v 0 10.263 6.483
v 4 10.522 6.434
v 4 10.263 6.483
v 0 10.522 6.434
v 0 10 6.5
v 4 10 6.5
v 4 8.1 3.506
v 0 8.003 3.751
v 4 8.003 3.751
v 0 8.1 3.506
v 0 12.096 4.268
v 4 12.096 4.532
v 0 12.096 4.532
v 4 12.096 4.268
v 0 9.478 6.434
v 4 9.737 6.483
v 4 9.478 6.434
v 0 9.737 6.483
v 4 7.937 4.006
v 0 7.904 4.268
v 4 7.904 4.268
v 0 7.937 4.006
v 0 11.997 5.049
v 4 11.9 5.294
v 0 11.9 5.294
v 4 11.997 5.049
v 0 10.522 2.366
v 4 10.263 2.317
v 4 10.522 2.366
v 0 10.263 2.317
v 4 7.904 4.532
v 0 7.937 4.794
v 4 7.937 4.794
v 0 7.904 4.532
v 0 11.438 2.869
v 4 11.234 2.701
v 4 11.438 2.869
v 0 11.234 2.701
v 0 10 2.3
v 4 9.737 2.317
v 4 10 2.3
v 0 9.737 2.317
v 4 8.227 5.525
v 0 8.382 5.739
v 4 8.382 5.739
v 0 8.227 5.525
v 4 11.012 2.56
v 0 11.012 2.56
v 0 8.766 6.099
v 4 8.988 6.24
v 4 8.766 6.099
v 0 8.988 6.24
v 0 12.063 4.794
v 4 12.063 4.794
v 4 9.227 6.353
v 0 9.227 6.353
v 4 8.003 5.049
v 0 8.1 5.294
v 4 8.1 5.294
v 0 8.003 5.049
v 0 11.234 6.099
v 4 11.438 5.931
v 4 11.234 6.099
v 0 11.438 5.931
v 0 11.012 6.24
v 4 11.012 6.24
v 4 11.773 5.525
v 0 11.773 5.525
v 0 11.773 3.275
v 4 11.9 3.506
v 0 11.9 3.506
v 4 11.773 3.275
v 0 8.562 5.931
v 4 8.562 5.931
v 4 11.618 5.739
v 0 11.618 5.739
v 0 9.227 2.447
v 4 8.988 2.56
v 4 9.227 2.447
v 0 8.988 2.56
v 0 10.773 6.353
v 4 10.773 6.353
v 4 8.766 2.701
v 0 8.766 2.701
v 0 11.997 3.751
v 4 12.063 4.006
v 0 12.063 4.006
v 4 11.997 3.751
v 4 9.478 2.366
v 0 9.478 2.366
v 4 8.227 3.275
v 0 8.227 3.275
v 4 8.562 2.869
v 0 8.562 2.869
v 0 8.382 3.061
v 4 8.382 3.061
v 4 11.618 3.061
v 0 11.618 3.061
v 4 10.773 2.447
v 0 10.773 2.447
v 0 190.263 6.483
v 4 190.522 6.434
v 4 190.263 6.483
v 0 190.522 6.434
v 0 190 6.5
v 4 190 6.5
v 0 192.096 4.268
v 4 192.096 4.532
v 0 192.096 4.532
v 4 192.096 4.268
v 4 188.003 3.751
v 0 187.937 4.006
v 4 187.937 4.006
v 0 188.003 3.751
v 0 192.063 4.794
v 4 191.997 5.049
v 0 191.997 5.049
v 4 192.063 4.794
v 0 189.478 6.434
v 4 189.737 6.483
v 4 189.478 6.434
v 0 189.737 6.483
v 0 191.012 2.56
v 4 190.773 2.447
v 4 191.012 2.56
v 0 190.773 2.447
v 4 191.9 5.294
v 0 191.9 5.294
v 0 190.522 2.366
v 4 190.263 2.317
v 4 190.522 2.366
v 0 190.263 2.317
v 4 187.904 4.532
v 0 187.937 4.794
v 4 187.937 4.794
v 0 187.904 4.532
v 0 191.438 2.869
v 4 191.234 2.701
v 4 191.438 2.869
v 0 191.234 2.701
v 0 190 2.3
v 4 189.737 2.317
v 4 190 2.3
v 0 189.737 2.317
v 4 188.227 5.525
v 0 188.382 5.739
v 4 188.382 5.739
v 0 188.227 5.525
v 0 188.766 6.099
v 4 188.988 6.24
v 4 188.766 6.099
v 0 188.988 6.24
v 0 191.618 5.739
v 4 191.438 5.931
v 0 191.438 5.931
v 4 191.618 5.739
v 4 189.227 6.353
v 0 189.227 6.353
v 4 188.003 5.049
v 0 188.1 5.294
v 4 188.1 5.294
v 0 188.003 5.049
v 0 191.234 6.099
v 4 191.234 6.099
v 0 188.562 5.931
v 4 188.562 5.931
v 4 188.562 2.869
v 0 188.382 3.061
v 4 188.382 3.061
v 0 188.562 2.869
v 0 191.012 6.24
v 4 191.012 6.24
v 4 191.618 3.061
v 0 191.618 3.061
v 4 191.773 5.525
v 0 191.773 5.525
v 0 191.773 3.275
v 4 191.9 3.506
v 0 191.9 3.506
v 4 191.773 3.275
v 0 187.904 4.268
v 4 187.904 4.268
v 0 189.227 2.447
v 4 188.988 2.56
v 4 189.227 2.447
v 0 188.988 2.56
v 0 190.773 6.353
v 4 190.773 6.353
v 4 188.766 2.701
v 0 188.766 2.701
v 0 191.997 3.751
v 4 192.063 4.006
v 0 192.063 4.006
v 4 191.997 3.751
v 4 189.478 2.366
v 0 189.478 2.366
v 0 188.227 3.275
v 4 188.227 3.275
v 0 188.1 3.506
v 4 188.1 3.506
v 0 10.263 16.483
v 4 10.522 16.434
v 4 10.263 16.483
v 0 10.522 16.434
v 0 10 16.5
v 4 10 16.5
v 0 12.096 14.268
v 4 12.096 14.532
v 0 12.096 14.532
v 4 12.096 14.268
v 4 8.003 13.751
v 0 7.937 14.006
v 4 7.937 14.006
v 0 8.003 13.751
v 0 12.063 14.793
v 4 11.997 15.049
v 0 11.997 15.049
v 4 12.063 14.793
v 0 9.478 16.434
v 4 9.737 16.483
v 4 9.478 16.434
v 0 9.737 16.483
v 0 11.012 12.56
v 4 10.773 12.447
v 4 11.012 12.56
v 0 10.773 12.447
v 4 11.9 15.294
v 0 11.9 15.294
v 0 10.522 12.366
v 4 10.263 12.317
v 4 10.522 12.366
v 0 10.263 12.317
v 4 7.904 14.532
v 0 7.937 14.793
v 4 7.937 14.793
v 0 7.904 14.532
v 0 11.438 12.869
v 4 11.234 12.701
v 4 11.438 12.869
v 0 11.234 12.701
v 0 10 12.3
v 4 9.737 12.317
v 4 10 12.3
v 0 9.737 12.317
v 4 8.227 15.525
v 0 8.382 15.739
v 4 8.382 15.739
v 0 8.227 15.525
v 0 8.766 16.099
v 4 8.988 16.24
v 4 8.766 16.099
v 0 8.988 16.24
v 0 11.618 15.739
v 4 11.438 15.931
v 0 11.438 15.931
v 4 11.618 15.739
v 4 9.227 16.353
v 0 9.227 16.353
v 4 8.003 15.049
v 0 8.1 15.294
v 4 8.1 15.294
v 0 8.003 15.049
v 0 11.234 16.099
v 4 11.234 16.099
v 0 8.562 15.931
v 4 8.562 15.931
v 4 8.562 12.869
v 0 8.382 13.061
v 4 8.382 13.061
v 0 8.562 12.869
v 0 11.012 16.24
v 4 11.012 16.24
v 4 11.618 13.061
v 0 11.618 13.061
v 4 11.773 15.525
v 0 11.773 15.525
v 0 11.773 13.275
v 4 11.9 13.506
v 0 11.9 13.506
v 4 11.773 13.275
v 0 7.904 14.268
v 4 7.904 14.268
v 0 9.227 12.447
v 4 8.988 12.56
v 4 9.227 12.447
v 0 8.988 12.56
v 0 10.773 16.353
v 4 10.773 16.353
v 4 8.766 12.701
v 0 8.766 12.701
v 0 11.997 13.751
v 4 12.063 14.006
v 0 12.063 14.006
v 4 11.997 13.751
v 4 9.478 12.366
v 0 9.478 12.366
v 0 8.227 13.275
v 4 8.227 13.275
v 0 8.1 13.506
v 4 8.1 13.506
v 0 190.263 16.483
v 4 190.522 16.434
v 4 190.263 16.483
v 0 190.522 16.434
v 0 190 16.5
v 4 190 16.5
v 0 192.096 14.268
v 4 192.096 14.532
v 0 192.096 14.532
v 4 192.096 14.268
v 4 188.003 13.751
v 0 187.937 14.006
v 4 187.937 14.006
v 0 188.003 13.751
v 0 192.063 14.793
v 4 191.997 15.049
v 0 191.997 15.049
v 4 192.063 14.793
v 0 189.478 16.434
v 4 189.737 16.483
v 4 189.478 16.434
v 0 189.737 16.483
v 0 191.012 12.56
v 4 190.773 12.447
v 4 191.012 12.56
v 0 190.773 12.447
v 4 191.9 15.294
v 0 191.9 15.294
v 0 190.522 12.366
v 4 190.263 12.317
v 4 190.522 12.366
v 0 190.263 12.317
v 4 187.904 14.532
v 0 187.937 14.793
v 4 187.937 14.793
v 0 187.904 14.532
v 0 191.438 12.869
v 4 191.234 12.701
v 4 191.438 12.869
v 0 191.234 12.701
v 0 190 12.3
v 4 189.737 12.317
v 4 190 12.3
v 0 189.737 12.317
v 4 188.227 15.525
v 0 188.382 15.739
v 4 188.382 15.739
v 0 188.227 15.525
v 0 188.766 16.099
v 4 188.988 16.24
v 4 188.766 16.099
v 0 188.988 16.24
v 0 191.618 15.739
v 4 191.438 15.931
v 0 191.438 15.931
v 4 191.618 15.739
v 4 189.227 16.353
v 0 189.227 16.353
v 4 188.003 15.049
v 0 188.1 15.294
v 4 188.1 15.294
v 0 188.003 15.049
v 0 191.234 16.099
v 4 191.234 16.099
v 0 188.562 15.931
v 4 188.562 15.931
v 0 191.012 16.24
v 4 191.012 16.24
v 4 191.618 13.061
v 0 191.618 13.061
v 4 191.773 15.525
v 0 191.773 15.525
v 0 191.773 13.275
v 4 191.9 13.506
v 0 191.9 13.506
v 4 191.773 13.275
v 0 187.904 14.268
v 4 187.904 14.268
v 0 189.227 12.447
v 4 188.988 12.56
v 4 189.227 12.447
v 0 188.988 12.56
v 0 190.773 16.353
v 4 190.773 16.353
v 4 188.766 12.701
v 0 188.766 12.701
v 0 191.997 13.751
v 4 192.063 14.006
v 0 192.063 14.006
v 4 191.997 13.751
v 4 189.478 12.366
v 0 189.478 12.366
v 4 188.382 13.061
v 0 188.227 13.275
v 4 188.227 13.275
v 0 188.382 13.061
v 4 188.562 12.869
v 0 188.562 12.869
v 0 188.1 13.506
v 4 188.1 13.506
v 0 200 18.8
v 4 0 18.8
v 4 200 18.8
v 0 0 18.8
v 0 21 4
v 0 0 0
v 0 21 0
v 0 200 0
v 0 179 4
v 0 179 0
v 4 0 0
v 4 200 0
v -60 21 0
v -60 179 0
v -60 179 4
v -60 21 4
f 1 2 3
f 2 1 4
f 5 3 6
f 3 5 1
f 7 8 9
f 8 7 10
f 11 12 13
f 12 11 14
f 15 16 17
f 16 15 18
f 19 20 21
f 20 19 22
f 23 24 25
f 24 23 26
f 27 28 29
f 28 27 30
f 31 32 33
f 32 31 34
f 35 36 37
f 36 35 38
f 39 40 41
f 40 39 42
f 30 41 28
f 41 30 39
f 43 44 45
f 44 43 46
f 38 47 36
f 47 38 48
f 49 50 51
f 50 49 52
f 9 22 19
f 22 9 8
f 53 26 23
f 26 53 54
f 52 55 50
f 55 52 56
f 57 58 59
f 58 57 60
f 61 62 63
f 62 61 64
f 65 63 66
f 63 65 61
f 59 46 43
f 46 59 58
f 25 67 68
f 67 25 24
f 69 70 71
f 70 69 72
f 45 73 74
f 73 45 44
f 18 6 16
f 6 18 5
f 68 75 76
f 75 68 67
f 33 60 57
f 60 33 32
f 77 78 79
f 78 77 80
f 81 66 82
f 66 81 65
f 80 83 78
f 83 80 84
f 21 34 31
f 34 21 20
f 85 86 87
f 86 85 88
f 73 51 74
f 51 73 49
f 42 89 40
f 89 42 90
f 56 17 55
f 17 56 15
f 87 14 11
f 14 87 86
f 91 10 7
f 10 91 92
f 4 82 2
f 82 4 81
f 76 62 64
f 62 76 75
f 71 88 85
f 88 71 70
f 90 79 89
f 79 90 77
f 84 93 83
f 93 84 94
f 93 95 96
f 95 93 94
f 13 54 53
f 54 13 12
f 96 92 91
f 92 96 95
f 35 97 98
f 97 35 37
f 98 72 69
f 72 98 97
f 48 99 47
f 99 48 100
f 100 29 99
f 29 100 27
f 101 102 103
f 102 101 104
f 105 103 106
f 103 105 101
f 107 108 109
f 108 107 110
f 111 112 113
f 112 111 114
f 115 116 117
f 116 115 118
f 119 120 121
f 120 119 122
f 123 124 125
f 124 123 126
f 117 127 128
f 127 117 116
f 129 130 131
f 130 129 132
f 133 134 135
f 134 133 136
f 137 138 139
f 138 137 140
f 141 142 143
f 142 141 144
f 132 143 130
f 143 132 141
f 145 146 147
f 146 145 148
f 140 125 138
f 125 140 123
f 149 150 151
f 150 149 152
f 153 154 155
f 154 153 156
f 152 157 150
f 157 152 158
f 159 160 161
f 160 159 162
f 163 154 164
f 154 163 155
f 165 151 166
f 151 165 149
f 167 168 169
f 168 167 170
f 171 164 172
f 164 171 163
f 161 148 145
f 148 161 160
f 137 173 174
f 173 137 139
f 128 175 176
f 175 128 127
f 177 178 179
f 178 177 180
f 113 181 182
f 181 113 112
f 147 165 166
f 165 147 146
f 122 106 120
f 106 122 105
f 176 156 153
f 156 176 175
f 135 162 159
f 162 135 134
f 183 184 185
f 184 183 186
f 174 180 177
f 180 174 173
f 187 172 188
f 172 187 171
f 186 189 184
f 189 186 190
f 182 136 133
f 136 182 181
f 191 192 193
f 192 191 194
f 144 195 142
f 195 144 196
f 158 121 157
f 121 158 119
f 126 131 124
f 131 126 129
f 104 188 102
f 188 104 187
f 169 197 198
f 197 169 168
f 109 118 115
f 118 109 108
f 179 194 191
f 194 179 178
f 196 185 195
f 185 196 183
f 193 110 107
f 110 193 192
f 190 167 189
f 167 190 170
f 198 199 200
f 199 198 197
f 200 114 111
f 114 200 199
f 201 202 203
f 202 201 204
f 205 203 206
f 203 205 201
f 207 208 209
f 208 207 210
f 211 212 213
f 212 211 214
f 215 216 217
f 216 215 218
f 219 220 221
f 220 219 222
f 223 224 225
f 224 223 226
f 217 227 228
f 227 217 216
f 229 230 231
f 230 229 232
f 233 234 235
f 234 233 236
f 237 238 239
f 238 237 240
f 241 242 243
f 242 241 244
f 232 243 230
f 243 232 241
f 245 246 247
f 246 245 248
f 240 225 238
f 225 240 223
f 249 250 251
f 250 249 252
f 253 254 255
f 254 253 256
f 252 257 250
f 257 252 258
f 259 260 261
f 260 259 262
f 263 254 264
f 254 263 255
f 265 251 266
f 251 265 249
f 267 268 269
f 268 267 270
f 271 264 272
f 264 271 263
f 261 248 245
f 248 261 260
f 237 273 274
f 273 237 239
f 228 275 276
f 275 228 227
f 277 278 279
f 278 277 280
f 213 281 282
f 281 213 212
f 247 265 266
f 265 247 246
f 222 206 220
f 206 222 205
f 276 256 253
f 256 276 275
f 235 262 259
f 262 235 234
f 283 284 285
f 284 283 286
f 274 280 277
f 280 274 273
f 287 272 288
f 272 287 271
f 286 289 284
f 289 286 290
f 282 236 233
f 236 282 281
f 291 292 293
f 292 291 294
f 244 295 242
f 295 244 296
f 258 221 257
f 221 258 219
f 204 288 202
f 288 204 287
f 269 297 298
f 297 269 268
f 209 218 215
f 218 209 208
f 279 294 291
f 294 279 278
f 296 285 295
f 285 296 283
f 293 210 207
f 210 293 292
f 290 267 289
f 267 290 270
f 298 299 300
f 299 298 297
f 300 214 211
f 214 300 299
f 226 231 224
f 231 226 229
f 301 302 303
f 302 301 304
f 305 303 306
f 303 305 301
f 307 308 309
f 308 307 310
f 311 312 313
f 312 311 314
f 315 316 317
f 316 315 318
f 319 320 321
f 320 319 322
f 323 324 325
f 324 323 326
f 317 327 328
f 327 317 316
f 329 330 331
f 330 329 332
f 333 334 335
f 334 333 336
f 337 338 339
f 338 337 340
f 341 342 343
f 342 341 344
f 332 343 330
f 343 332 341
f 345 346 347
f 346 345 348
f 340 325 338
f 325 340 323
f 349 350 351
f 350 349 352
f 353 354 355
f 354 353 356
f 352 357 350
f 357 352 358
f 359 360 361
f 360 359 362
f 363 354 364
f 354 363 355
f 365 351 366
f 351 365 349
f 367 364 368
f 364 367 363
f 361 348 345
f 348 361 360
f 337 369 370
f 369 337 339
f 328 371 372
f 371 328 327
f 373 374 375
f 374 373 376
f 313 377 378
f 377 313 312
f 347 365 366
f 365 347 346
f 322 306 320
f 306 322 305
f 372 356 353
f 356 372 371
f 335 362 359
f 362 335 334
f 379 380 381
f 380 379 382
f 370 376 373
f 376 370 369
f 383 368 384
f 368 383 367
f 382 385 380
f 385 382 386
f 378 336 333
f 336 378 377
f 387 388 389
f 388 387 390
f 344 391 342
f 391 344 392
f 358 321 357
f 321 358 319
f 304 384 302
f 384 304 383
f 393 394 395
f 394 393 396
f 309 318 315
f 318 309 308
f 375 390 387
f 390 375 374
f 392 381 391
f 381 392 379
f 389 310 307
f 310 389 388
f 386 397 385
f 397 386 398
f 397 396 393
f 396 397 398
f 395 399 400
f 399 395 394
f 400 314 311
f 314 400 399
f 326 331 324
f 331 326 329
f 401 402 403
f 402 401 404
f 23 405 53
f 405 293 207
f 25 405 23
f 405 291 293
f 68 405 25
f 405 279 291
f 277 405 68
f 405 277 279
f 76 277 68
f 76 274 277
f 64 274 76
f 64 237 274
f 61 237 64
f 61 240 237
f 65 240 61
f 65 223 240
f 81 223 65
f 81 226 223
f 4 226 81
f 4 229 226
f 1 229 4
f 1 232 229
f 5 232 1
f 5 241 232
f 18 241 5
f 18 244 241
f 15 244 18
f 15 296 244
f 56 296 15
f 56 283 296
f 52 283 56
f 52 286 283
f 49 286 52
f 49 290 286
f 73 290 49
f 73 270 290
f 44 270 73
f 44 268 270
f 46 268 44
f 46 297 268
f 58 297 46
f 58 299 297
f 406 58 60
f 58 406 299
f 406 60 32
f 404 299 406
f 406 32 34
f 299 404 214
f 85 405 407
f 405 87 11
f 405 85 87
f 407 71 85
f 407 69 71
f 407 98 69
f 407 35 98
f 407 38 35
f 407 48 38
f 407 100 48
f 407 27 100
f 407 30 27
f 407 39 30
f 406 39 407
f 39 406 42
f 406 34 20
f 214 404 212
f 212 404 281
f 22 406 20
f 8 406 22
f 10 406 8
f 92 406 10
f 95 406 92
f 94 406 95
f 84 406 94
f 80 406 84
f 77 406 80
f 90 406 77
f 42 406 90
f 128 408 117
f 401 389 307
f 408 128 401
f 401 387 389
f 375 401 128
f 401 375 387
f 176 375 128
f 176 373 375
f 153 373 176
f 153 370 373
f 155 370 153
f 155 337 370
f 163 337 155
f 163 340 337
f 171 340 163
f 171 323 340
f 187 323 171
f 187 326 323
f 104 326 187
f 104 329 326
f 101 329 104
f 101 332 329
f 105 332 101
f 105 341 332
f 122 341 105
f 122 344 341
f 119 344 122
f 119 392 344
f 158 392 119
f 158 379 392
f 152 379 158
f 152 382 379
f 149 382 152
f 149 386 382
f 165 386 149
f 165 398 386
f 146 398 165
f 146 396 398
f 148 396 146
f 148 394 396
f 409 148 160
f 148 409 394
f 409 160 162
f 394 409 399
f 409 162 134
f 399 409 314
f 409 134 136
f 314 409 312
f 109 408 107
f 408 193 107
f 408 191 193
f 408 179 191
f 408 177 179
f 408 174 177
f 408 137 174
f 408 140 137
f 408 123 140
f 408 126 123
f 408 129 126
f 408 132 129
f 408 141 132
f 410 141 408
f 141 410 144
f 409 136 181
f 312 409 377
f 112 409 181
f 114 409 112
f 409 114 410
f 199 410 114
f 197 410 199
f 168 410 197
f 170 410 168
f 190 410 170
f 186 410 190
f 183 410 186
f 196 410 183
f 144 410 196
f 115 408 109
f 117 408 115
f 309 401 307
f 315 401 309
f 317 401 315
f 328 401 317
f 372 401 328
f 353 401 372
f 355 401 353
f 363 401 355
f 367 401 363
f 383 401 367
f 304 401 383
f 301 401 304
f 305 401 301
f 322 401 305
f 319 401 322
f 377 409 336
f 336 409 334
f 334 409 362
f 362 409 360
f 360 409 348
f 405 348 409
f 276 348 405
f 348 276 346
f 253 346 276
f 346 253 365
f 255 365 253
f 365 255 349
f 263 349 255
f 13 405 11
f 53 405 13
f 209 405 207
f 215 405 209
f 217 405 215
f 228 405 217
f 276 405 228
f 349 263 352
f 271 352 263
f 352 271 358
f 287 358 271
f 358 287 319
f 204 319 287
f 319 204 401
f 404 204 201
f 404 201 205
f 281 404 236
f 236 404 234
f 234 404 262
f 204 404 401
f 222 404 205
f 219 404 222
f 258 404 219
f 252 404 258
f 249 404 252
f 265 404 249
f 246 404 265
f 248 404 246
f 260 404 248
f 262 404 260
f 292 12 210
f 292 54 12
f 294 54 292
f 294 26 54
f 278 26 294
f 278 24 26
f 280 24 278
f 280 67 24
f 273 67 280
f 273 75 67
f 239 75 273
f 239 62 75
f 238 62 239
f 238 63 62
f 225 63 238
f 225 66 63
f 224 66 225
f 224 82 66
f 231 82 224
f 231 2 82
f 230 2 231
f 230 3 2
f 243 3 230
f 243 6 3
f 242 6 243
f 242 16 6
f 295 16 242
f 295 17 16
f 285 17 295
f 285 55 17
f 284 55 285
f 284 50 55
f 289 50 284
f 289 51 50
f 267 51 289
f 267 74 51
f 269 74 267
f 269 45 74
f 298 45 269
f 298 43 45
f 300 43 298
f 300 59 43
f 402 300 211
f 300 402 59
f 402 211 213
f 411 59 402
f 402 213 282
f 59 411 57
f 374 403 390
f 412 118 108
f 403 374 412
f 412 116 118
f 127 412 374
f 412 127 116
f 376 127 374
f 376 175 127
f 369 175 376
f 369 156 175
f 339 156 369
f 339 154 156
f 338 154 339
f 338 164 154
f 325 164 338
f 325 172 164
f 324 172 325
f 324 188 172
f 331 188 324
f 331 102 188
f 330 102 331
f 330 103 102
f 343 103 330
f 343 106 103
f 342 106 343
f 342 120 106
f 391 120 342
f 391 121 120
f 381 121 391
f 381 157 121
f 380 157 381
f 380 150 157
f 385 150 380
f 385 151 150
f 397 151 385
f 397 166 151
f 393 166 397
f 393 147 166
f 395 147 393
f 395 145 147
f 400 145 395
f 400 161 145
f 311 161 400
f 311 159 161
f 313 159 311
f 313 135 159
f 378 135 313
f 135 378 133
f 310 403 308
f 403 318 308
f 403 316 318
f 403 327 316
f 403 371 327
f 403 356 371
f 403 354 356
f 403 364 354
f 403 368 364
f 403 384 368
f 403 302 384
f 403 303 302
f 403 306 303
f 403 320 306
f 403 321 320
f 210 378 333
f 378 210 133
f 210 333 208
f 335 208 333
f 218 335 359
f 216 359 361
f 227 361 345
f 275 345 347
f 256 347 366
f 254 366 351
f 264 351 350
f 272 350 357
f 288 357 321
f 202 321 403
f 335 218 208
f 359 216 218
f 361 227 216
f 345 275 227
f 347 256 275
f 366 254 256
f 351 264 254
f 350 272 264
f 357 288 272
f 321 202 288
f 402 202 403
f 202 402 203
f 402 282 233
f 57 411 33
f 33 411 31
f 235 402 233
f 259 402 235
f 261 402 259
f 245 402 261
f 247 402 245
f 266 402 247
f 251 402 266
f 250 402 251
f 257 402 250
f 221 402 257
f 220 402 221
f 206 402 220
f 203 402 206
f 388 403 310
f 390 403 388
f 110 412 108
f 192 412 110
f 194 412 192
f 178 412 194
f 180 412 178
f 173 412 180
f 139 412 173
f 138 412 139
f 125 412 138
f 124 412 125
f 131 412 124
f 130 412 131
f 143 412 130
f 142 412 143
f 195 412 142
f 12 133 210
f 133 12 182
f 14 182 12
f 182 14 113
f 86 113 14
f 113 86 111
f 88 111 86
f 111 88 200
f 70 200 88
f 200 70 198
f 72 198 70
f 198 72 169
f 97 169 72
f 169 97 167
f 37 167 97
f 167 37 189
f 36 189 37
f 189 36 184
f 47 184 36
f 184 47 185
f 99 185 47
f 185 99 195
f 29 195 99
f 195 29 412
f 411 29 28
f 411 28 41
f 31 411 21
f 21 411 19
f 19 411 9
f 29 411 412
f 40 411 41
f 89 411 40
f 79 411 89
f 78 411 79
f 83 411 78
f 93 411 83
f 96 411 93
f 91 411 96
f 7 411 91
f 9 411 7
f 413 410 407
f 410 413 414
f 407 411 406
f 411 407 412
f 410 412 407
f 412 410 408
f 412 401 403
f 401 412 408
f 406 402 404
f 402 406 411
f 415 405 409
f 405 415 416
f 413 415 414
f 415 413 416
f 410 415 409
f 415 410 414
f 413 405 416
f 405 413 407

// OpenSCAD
// file: front_plate.scad
$fn = 50;

// Customizable settings
front_plate_thickness = 4;
front_plate_units = 3;

// Constants
m4_screw_hole_loose_diam = 4.2;
unit_len = 10; // 1U = 10mm
v_slot_size = 20; // 20x20mm V-Slot
rack_width = 200;
edge_offset = 0.6; // Top/bottom edge additional empty space

// Front plate generation
front_plate(front_plate_units, front_plate_thickness);

module front_plate(unit_count, thickness){
    difference(){
        union(){
            plate_height = unit_len*unit_count - edge_offset*2;
            cube([plate_height,rack_width,thickness]);
        }                        
        for(i=[1:unit_count]){ // Screw holes
            translate([-edge_offset,0,0])
            union(){
            translate([unit_len*i-unit_len/2,v_slot_size/2,-1]){
                cylinder(d=m4_screw_hole_loose_diam,h=thickness+2);
            } 
            translate([unit_len*i-unit_len/2,rack_width-v_slot_size/2,-1]){
                cylinder(d=m4_screw_hole_loose_diam,h=thickness+2);
            }       
            }               
        }
    }
}
// main file
$fn = 50;

use <front_plate.scad>

// Customizable settings
front_plate_thickness = 4;
front_plate_units = 2;
base_plate_length = 60;
base_plate_thickness = 4;

// Rack module generation
rack_module(
    front_plate_units, 
    front_plate_thickness, 
    base_plate_length, 
    base_plate_thickness
);

// Constants
m4_screw_hole_loose_diam = 4.2;
unit_len = 10; // 1U = 10mm
v_slot_size = 20; // 20x20mm V-Slot
rack_width = 200;
edge_offset = 0.6; // Top/bottom edge additional empty space
base_plate_side_offset = 1;

module rack_module(
    front_plate_units, 
    front_plate_thickness,
    base_plate_length,
    base_plate_thickness
){
    union(){
        // Front plate
        translate([front_plate_thickness,0,0])
        rotate([0,-90,0])
        front_plate(front_plate_units, front_plate_thickness);

        // Base plate
        base_plate_width = rack_width - 2*v_slot_size - 2*base_plate_side_offset;
        base_plate_left_side_offset = v_slot_size+base_plate_side_offset;
        translate([-base_plate_length,base_plate_left_side_offset,0])
        cube([
            base_plate_length,
            base_plate_width,
            base_plate_thickness
        ]);
    }
}
